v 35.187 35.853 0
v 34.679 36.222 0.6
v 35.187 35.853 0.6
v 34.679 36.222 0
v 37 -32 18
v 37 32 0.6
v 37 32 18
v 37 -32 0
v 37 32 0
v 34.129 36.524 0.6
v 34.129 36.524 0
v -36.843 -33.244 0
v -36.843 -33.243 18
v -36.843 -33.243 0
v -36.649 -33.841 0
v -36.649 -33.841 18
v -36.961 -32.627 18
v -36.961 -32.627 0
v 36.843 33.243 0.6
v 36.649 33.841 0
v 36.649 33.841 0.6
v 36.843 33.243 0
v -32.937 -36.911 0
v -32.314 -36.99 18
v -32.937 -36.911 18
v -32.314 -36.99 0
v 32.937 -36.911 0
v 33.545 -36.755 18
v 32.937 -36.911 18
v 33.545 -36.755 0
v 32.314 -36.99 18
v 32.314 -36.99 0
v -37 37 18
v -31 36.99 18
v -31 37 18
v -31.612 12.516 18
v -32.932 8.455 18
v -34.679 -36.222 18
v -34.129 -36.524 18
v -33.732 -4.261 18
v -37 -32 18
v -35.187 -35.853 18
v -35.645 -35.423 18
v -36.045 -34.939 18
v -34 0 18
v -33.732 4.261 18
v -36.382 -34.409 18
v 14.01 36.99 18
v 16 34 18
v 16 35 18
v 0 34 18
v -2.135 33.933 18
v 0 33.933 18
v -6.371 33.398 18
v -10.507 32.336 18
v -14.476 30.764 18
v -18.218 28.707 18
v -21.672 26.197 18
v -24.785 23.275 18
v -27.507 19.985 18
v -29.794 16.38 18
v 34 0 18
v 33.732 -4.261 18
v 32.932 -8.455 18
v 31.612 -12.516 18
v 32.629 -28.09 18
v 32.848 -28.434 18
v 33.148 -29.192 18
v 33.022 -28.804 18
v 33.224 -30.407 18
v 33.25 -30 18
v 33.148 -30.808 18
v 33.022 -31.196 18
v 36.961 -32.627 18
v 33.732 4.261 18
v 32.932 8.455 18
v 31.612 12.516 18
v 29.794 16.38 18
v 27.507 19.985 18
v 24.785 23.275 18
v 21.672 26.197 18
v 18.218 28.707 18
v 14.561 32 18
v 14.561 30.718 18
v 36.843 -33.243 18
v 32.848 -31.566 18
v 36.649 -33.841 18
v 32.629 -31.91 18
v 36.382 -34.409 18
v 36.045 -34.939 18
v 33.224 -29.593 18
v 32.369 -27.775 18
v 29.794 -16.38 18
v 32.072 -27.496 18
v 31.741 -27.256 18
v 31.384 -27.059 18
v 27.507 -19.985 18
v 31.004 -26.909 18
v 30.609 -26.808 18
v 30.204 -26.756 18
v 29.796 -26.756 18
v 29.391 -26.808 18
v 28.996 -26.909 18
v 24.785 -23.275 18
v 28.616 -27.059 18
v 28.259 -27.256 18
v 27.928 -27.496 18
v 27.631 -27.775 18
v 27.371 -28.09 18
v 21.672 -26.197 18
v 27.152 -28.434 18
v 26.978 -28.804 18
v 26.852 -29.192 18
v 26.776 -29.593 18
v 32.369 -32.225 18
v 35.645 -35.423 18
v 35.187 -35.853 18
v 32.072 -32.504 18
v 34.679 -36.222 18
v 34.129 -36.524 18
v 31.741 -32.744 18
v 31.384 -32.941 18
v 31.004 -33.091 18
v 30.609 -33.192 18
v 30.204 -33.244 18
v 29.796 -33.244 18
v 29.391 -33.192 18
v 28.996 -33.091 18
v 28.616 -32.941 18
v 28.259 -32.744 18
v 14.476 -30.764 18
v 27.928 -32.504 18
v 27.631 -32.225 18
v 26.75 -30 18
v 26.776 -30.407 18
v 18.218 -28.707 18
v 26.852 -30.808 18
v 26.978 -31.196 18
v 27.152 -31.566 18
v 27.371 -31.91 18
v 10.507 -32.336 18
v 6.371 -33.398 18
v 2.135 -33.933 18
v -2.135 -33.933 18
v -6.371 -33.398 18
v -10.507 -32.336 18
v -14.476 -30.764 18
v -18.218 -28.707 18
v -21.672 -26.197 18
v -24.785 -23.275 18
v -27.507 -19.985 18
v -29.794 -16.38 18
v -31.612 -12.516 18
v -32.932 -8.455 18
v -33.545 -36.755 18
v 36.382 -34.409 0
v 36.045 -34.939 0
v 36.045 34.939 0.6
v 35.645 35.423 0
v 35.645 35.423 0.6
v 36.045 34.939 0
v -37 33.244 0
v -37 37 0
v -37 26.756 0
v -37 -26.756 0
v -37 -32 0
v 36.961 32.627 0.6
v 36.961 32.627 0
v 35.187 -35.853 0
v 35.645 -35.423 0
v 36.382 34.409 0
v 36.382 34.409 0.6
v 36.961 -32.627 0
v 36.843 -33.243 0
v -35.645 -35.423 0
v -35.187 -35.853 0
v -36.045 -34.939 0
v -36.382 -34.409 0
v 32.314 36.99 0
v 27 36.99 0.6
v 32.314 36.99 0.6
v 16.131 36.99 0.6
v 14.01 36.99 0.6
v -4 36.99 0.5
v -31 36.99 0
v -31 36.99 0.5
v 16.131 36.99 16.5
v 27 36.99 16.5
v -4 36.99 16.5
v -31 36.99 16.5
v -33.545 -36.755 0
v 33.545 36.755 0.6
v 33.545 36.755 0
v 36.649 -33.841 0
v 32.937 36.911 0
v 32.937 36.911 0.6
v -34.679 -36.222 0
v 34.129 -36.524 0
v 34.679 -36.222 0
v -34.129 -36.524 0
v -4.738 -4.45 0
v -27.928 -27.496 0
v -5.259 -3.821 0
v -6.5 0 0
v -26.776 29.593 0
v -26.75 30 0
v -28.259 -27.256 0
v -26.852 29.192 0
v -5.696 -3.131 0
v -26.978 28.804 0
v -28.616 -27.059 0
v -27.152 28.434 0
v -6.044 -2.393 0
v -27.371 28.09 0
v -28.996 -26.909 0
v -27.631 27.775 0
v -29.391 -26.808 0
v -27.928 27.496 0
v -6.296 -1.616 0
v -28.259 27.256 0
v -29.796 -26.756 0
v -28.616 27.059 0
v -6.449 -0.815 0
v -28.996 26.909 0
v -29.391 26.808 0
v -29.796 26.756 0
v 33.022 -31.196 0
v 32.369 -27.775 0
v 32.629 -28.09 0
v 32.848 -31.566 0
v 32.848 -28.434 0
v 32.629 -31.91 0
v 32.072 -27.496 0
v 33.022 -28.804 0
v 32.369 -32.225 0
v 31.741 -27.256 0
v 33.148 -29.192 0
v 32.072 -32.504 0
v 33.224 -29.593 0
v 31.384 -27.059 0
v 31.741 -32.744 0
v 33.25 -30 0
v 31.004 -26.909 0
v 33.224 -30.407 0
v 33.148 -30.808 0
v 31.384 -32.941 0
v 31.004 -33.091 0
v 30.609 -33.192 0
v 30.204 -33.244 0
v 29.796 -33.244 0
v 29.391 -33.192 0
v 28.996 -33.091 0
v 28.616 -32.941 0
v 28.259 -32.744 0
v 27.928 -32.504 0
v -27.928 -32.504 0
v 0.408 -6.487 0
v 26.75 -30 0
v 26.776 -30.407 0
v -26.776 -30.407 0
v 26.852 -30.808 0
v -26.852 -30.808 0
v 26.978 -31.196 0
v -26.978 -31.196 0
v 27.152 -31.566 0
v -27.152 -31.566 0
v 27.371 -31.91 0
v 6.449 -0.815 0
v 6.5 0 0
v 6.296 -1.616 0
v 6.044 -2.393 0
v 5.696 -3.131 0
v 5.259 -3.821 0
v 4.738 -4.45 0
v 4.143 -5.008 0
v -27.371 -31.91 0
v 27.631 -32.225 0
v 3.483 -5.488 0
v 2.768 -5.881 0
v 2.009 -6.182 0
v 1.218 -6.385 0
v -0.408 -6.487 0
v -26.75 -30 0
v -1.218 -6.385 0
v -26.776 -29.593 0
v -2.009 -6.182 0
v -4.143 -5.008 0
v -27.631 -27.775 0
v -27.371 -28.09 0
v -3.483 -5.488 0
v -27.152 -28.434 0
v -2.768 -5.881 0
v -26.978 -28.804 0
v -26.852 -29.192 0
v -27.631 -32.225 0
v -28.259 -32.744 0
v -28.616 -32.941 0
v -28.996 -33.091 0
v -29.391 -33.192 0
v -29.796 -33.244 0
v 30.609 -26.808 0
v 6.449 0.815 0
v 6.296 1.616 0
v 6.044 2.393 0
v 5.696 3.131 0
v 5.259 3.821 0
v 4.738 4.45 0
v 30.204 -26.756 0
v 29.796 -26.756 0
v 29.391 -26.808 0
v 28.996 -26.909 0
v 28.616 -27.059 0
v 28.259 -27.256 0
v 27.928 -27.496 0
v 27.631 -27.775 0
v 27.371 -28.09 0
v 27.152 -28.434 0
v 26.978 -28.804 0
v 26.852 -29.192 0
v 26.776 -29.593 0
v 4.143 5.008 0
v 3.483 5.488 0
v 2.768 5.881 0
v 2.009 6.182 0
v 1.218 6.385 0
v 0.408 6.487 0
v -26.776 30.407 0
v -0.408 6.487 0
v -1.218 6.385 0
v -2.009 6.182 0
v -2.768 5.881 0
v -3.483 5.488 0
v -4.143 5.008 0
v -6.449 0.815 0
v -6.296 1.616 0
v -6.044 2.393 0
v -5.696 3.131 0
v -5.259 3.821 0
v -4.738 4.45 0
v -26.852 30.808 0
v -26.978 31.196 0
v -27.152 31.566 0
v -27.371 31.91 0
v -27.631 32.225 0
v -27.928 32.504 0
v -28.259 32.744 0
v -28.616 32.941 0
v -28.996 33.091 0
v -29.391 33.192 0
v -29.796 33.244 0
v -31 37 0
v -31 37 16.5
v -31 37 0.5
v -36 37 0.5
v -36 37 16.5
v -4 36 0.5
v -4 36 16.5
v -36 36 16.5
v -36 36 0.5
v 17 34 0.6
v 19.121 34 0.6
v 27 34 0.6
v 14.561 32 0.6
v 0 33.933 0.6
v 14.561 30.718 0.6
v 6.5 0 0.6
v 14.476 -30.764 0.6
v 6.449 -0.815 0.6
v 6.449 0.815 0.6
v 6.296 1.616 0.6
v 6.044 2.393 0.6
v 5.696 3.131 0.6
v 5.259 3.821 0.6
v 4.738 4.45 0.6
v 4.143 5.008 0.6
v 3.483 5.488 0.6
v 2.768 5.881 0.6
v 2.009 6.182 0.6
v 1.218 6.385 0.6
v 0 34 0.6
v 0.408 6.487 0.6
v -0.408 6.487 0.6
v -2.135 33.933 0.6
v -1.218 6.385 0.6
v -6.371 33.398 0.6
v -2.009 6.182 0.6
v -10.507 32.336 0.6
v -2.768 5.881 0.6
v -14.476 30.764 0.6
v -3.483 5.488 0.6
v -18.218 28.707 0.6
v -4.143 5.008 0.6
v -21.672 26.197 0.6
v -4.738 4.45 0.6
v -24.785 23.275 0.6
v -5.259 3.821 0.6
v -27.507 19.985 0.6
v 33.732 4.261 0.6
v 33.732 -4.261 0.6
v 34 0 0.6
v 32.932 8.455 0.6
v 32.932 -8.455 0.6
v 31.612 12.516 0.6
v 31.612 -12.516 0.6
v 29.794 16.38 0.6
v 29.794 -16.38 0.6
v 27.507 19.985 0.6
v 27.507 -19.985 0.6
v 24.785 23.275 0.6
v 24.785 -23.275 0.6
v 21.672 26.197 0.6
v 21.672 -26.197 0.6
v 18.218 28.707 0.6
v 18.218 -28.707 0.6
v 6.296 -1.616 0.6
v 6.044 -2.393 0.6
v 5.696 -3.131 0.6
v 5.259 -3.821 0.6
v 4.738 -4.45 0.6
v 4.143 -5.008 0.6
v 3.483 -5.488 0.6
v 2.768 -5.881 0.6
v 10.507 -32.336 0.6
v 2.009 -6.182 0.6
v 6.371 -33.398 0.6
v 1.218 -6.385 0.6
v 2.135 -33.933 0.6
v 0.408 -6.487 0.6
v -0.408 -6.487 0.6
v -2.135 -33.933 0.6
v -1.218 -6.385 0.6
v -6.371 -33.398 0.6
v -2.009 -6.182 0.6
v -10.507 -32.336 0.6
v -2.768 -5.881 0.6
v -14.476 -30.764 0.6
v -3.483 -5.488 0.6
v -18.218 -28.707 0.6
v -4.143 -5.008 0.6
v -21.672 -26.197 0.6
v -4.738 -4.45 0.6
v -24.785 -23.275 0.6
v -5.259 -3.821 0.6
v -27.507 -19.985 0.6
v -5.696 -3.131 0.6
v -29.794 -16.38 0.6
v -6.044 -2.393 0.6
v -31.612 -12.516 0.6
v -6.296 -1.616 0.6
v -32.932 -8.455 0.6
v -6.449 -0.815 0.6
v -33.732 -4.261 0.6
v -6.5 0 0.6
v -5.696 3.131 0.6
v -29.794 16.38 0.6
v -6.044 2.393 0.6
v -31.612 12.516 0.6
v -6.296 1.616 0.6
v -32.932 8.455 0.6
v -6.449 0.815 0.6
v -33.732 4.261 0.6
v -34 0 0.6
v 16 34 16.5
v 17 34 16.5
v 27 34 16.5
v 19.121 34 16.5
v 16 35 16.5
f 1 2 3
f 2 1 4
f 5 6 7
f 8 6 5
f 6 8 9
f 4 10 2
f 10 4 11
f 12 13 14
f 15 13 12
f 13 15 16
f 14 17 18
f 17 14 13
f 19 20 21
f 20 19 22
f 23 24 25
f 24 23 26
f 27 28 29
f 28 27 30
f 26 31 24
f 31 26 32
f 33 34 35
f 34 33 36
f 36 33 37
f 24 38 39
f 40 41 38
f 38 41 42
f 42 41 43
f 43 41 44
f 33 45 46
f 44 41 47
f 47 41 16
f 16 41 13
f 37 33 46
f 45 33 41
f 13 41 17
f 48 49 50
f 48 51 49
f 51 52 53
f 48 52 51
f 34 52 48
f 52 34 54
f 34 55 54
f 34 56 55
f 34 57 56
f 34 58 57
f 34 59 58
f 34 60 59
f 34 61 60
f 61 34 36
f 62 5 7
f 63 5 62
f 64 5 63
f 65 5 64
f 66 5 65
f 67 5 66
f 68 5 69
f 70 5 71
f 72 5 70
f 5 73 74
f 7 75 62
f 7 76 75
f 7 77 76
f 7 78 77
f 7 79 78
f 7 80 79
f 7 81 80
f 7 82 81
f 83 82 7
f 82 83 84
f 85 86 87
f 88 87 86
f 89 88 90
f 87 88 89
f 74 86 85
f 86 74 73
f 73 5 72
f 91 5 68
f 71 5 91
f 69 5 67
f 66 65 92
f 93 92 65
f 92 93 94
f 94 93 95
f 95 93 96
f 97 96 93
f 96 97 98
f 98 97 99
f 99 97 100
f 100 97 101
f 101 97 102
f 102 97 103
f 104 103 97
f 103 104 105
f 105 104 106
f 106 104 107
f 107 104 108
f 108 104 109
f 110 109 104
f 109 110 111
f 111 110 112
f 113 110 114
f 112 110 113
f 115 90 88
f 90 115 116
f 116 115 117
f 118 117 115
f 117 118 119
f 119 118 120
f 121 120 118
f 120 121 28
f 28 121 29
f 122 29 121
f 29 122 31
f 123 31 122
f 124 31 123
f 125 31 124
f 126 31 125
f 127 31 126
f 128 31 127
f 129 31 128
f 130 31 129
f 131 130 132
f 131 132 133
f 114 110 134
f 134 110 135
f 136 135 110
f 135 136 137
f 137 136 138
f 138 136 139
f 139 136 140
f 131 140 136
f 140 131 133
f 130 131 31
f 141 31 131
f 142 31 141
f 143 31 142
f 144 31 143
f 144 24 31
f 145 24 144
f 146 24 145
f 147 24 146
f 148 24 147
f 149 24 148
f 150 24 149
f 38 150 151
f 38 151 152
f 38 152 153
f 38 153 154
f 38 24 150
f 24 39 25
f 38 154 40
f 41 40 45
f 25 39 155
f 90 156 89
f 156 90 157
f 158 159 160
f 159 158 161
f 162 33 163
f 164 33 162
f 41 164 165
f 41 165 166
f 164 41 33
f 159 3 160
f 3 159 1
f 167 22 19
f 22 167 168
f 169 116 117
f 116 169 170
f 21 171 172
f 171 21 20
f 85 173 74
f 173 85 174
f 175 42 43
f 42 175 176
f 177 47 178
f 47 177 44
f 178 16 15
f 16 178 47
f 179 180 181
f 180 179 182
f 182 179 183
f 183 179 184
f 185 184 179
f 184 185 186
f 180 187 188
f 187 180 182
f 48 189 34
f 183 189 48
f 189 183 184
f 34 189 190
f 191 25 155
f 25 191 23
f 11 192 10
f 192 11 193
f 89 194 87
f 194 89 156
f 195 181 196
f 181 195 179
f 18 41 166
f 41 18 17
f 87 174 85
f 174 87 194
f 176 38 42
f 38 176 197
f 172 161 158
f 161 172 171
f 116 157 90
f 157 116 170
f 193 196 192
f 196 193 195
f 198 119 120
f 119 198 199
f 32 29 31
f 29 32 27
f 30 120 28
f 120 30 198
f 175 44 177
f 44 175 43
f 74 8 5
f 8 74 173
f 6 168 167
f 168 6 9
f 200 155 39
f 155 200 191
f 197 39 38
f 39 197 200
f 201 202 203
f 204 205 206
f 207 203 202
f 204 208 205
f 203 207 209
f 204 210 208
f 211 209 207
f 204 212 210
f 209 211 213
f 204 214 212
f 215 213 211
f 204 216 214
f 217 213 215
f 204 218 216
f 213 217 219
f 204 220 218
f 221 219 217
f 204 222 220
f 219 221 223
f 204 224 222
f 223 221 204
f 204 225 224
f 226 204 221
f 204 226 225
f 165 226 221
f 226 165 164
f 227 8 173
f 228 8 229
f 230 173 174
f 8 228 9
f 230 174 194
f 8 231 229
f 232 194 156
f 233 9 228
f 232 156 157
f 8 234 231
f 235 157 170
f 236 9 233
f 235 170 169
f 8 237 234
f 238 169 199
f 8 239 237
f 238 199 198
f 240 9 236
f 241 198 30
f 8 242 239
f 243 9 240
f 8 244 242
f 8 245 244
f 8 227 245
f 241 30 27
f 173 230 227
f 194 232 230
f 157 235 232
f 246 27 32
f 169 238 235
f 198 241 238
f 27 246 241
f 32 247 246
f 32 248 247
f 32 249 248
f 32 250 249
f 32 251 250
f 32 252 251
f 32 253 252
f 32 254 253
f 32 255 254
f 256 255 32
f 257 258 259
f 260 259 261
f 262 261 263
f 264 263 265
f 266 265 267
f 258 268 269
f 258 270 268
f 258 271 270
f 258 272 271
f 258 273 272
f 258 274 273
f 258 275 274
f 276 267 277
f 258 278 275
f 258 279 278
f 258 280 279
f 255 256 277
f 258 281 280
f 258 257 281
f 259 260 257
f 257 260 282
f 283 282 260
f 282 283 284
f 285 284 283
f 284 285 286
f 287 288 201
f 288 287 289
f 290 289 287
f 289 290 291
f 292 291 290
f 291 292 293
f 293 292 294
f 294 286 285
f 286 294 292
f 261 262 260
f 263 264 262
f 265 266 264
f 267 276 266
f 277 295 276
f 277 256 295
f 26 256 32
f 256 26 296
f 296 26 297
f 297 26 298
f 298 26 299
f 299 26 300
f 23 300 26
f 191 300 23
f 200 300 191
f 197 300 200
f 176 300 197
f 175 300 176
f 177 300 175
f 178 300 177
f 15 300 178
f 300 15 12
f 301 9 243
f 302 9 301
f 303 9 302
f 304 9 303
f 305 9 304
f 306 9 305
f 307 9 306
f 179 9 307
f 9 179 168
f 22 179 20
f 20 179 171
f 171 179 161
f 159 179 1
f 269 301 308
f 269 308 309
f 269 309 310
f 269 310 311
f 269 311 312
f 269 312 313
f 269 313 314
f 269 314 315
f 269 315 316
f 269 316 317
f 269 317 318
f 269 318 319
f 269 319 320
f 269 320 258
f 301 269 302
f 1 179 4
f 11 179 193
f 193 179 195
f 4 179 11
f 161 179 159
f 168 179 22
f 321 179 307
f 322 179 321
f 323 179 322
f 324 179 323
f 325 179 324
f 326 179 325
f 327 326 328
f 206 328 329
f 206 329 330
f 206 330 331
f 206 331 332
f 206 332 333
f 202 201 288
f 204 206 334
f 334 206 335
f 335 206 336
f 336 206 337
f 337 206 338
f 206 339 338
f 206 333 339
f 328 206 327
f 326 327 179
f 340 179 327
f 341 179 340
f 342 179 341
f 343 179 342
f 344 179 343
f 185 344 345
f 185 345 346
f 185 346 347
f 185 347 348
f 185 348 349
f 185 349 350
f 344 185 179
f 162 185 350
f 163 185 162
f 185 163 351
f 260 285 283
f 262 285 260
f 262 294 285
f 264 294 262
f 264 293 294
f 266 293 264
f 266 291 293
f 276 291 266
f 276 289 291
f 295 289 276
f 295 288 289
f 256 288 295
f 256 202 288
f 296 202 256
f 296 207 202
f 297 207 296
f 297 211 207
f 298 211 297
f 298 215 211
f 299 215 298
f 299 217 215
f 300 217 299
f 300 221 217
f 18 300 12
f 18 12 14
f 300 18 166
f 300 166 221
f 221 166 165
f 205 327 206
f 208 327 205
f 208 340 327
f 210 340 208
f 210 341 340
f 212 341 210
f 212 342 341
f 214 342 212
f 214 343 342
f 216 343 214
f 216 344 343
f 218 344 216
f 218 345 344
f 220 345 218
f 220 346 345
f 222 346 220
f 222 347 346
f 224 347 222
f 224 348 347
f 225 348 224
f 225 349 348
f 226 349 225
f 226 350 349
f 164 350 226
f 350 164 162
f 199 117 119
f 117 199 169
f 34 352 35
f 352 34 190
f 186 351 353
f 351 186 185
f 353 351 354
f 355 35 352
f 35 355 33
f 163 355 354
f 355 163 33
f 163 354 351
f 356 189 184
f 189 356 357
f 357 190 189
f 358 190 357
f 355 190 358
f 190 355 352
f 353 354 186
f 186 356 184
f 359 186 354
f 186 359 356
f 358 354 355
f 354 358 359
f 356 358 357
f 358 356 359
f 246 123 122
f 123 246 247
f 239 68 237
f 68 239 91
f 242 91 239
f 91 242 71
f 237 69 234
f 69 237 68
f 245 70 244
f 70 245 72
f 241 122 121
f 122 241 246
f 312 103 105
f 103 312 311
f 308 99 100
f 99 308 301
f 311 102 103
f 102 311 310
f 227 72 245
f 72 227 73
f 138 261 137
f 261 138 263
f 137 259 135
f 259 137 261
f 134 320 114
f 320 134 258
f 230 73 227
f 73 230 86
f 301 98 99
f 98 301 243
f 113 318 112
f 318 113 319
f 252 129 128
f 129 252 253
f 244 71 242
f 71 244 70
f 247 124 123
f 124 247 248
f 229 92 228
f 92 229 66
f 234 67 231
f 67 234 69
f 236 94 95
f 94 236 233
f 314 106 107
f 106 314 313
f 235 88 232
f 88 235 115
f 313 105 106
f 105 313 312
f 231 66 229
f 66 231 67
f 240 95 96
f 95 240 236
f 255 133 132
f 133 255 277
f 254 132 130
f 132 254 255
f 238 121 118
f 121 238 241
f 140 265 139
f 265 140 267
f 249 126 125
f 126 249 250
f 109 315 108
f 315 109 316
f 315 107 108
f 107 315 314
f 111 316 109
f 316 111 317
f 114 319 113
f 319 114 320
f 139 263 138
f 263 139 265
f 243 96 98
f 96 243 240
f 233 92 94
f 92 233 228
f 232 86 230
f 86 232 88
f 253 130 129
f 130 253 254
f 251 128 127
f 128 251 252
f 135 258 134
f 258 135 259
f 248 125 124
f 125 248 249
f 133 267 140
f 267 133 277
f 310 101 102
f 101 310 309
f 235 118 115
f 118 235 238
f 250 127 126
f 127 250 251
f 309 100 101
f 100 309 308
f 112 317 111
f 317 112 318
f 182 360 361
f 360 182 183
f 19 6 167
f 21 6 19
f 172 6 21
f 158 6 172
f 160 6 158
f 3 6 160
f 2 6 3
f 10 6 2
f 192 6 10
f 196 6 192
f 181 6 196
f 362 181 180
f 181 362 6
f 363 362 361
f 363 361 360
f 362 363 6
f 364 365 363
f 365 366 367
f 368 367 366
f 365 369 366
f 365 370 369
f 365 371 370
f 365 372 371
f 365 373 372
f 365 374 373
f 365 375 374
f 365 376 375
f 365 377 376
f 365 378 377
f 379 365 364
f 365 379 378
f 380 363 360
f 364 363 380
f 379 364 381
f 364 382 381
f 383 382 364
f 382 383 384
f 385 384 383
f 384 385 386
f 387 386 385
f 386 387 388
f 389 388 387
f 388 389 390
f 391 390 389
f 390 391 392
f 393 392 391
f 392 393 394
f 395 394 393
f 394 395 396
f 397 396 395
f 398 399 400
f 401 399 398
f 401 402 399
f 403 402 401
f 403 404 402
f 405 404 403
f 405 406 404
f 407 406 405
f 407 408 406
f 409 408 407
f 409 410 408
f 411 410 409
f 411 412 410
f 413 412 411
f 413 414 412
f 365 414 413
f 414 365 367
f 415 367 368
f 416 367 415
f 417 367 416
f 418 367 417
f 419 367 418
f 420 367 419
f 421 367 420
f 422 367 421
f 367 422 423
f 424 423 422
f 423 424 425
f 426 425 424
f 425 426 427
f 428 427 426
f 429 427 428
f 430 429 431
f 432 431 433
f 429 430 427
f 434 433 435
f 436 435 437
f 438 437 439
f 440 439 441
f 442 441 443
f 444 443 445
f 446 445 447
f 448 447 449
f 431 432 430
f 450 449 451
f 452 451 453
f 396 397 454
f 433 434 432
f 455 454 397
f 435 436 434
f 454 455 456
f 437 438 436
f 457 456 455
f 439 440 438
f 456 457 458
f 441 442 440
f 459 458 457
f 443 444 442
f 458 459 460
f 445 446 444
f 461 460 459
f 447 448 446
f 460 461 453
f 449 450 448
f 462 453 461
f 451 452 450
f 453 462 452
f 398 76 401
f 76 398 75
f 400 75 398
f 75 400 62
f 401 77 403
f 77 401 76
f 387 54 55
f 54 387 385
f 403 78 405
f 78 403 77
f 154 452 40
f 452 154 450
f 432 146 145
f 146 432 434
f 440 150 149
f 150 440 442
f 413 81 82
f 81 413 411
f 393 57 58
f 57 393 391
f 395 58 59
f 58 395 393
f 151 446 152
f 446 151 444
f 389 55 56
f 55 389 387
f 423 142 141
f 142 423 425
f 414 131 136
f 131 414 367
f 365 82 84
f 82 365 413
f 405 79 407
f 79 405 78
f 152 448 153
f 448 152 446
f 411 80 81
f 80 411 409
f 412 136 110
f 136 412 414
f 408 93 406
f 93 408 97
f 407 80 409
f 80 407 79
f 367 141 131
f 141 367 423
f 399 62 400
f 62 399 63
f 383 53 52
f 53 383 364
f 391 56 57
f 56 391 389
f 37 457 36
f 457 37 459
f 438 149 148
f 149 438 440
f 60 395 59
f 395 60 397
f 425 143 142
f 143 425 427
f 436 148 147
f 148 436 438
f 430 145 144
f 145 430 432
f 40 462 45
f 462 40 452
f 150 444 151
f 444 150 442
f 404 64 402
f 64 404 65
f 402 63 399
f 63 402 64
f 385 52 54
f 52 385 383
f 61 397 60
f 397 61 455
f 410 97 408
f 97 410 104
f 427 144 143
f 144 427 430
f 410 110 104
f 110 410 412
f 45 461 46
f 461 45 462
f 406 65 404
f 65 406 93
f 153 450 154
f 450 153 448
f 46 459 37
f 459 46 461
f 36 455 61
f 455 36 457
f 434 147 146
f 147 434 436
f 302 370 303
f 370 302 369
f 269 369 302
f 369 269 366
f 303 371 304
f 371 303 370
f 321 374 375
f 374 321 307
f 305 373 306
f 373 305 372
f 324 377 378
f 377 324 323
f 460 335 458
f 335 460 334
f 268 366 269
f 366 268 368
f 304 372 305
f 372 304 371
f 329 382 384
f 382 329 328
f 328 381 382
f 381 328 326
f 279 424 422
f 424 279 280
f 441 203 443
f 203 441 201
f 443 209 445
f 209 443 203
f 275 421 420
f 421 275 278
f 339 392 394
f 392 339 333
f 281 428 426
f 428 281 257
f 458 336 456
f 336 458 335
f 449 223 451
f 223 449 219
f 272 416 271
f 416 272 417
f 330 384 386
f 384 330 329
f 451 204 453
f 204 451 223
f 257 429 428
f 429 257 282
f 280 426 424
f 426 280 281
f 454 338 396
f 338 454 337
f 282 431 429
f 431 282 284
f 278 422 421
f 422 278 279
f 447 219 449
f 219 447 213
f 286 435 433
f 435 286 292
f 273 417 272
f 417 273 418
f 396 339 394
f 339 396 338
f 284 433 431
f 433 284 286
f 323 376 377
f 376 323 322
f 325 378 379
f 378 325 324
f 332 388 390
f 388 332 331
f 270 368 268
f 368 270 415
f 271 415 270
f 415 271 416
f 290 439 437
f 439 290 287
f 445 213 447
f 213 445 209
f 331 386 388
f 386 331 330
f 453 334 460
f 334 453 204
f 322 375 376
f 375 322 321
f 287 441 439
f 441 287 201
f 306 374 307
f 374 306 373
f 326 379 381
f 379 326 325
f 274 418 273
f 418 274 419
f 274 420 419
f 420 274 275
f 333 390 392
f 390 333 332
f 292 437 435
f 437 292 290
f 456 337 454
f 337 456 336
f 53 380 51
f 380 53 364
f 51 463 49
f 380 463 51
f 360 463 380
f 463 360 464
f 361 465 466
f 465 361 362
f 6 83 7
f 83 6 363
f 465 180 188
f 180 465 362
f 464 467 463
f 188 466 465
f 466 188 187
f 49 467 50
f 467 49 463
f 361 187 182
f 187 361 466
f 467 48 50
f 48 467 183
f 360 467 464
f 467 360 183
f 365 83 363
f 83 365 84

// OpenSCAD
$fn = 50;


difference() {
	union() {
		hull() {
			translate(v = [-32.0000000000, 32.0000000000, 0]) {
				cylinder(h = 18, r = 5);
			}
			translate(v = [32.0000000000, 32.0000000000, 0]) {
				cylinder(h = 18, r = 5);
			}
			translate(v = [-32.0000000000, -32.0000000000, 0]) {
				cylinder(h = 18, r = 5);
			}
			translate(v = [32.0000000000, -32.0000000000, 0]) {
				cylinder(h = 18, r = 5);
			}
		}
		translate(v = [-37.0000000000, 31.0000000000, 0]) {
			cube(size = [6, 6, 18]);
		}
	}
	union() {
		translate(v = [-37.5000000000, -30.0000000000, -250.0000000000]) {
			rotate(a = [0, 0, 0]) {
				difference() {
					union() {
						hull() {
							translate(v = [7.5000000000, 0, 0]) {
								cylinder(h = 250, r = 3.2500000000, r1 = 3.2500000000, r2 = 3.2500000000);
							}
							translate(v = [-7.5000000000, 0, 0]) {
								cylinder(h = 250, r = 3.2500000000, r1 = 3.2500000000, r2 = 3.2500000000);
							}
						}
					}
					union();
				}
			}
		}
		translate(v = [-37.5000000000, 30.0000000000, -250.0000000000]) {
			rotate(a = [0, 0, 0]) {
				difference() {
					union() {
						hull() {
							translate(v = [7.5000000000, 0, 0]) {
								cylinder(h = 250, r = 3.2500000000, r1 = 3.2500000000, r2 = 3.2500000000);
							}
							translate(v = [-7.5000000000, 0, 0]) {
								cylinder(h = 250, r = 3.2500000000, r1 = 3.2500000000, r2 = 3.2500000000);
							}
						}
					}
					union();
				}
			}
		}
		translate(v = [-36.0000000000, 36.0000000000, 0.5000000000]) {
			cube(size = [32, 1, 16]);
		}
		translate(v = [30.0000000000, -30.0000000000, -50.0000000000]) {
			cylinder(h = 100, r = 3.2500000000);
		}
		translate(v = [0, 0, 0.6000000000]) {
			cylinder(h = 20.4000000000, r = 34.0000000000);
		}
		translate(v = [0, 0, -9.0000000000]) {
			cylinder(h = 18, r = 6.5000000000);
		}
		translate(v = [0.0000000000, 32.0000000000, 0.6000000000]) {
			cube(size = [37.0000000000, 2, 20.4000000000]);
		}
		translate(v = [27.0000000000, 32.0000000000, 0.6000000000]) {
			cube(size = [10, 5, 20.4000000000]);
		}
		translate(v = [16.0000000000, 32.0000000000, 16.5000000000]) {
			cube(size = [21, 5, 1.5000000000]);
		}
		translate(v = [13.2500000000, 37.7500000000, 0.6000000000]) {
			rotate(a = [0, 0, -45]) {
				cube(size = [7.5000000000, 1.5000000000, 20.4000000000]);
			}
		}
		translate(v = [7.0610000000, 30.0000000000, 0.6000000000]) {
			cube(size = [7.5000000000, 2, 17.4000000000]);
		}
	}
}
